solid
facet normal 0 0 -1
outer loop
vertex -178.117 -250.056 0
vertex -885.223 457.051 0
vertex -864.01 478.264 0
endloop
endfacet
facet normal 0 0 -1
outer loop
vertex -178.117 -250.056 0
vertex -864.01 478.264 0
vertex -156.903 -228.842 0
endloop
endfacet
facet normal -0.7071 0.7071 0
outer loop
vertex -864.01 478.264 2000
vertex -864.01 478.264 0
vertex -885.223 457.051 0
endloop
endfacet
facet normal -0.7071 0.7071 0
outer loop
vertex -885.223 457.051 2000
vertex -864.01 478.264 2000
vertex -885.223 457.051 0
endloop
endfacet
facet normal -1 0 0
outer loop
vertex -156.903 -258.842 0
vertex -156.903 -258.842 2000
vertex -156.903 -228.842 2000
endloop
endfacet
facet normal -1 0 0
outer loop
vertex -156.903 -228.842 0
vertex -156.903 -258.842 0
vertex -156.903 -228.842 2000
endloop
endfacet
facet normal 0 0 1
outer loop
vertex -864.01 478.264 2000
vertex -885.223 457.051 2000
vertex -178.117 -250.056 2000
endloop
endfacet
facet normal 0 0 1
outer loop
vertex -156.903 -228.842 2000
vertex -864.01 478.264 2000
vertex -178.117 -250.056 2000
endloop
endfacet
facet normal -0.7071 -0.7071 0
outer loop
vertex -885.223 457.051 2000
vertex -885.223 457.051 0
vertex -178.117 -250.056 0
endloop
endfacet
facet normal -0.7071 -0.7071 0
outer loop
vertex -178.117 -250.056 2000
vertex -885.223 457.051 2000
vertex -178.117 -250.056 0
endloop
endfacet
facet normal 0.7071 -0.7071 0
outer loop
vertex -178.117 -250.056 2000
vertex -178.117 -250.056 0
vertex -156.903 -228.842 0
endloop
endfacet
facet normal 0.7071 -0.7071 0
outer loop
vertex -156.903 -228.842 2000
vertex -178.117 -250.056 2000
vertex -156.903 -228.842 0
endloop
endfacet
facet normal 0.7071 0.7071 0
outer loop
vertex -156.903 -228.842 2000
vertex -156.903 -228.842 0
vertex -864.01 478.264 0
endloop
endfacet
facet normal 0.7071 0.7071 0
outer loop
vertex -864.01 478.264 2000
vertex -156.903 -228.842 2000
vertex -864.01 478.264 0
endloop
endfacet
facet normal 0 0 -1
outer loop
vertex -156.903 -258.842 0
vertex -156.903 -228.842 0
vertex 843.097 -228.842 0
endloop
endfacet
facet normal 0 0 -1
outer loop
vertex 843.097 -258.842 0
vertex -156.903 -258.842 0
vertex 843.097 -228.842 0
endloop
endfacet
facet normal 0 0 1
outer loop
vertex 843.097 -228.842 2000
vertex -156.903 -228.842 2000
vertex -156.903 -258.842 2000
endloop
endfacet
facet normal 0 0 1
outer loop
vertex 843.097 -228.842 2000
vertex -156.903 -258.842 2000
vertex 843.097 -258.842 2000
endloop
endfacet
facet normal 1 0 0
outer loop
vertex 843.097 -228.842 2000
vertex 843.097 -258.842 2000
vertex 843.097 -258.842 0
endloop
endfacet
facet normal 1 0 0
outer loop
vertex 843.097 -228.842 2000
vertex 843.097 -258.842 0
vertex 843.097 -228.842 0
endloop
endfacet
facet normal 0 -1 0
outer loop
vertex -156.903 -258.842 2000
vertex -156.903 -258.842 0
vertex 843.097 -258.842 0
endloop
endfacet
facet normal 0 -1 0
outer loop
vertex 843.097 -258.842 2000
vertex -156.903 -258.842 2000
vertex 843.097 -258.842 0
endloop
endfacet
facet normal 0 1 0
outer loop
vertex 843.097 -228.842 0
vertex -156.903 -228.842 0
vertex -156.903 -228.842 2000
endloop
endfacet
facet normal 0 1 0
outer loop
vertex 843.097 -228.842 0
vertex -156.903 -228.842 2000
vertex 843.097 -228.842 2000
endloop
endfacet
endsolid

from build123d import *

# Parameters (mm, degrees)
F0_W     = 1000
F0_H     = 30
F1_DEPTH = 2000


with BuildPart() as f1:
    # F0 (on Top) → F1 (new body)
    with BuildSketch(Plane.XY):
        with Locations((343.096574, -243.842466)):
            Rectangle(F0_W, F0_H)
        Polygon((-178.11663, -250.05567), (-156.903426, -228.842466), (-864.010207, 478.264315), (-885.223411, 457.051111), align=None)
    extrude(amount=F1_DEPTH)


solid = f1.part
